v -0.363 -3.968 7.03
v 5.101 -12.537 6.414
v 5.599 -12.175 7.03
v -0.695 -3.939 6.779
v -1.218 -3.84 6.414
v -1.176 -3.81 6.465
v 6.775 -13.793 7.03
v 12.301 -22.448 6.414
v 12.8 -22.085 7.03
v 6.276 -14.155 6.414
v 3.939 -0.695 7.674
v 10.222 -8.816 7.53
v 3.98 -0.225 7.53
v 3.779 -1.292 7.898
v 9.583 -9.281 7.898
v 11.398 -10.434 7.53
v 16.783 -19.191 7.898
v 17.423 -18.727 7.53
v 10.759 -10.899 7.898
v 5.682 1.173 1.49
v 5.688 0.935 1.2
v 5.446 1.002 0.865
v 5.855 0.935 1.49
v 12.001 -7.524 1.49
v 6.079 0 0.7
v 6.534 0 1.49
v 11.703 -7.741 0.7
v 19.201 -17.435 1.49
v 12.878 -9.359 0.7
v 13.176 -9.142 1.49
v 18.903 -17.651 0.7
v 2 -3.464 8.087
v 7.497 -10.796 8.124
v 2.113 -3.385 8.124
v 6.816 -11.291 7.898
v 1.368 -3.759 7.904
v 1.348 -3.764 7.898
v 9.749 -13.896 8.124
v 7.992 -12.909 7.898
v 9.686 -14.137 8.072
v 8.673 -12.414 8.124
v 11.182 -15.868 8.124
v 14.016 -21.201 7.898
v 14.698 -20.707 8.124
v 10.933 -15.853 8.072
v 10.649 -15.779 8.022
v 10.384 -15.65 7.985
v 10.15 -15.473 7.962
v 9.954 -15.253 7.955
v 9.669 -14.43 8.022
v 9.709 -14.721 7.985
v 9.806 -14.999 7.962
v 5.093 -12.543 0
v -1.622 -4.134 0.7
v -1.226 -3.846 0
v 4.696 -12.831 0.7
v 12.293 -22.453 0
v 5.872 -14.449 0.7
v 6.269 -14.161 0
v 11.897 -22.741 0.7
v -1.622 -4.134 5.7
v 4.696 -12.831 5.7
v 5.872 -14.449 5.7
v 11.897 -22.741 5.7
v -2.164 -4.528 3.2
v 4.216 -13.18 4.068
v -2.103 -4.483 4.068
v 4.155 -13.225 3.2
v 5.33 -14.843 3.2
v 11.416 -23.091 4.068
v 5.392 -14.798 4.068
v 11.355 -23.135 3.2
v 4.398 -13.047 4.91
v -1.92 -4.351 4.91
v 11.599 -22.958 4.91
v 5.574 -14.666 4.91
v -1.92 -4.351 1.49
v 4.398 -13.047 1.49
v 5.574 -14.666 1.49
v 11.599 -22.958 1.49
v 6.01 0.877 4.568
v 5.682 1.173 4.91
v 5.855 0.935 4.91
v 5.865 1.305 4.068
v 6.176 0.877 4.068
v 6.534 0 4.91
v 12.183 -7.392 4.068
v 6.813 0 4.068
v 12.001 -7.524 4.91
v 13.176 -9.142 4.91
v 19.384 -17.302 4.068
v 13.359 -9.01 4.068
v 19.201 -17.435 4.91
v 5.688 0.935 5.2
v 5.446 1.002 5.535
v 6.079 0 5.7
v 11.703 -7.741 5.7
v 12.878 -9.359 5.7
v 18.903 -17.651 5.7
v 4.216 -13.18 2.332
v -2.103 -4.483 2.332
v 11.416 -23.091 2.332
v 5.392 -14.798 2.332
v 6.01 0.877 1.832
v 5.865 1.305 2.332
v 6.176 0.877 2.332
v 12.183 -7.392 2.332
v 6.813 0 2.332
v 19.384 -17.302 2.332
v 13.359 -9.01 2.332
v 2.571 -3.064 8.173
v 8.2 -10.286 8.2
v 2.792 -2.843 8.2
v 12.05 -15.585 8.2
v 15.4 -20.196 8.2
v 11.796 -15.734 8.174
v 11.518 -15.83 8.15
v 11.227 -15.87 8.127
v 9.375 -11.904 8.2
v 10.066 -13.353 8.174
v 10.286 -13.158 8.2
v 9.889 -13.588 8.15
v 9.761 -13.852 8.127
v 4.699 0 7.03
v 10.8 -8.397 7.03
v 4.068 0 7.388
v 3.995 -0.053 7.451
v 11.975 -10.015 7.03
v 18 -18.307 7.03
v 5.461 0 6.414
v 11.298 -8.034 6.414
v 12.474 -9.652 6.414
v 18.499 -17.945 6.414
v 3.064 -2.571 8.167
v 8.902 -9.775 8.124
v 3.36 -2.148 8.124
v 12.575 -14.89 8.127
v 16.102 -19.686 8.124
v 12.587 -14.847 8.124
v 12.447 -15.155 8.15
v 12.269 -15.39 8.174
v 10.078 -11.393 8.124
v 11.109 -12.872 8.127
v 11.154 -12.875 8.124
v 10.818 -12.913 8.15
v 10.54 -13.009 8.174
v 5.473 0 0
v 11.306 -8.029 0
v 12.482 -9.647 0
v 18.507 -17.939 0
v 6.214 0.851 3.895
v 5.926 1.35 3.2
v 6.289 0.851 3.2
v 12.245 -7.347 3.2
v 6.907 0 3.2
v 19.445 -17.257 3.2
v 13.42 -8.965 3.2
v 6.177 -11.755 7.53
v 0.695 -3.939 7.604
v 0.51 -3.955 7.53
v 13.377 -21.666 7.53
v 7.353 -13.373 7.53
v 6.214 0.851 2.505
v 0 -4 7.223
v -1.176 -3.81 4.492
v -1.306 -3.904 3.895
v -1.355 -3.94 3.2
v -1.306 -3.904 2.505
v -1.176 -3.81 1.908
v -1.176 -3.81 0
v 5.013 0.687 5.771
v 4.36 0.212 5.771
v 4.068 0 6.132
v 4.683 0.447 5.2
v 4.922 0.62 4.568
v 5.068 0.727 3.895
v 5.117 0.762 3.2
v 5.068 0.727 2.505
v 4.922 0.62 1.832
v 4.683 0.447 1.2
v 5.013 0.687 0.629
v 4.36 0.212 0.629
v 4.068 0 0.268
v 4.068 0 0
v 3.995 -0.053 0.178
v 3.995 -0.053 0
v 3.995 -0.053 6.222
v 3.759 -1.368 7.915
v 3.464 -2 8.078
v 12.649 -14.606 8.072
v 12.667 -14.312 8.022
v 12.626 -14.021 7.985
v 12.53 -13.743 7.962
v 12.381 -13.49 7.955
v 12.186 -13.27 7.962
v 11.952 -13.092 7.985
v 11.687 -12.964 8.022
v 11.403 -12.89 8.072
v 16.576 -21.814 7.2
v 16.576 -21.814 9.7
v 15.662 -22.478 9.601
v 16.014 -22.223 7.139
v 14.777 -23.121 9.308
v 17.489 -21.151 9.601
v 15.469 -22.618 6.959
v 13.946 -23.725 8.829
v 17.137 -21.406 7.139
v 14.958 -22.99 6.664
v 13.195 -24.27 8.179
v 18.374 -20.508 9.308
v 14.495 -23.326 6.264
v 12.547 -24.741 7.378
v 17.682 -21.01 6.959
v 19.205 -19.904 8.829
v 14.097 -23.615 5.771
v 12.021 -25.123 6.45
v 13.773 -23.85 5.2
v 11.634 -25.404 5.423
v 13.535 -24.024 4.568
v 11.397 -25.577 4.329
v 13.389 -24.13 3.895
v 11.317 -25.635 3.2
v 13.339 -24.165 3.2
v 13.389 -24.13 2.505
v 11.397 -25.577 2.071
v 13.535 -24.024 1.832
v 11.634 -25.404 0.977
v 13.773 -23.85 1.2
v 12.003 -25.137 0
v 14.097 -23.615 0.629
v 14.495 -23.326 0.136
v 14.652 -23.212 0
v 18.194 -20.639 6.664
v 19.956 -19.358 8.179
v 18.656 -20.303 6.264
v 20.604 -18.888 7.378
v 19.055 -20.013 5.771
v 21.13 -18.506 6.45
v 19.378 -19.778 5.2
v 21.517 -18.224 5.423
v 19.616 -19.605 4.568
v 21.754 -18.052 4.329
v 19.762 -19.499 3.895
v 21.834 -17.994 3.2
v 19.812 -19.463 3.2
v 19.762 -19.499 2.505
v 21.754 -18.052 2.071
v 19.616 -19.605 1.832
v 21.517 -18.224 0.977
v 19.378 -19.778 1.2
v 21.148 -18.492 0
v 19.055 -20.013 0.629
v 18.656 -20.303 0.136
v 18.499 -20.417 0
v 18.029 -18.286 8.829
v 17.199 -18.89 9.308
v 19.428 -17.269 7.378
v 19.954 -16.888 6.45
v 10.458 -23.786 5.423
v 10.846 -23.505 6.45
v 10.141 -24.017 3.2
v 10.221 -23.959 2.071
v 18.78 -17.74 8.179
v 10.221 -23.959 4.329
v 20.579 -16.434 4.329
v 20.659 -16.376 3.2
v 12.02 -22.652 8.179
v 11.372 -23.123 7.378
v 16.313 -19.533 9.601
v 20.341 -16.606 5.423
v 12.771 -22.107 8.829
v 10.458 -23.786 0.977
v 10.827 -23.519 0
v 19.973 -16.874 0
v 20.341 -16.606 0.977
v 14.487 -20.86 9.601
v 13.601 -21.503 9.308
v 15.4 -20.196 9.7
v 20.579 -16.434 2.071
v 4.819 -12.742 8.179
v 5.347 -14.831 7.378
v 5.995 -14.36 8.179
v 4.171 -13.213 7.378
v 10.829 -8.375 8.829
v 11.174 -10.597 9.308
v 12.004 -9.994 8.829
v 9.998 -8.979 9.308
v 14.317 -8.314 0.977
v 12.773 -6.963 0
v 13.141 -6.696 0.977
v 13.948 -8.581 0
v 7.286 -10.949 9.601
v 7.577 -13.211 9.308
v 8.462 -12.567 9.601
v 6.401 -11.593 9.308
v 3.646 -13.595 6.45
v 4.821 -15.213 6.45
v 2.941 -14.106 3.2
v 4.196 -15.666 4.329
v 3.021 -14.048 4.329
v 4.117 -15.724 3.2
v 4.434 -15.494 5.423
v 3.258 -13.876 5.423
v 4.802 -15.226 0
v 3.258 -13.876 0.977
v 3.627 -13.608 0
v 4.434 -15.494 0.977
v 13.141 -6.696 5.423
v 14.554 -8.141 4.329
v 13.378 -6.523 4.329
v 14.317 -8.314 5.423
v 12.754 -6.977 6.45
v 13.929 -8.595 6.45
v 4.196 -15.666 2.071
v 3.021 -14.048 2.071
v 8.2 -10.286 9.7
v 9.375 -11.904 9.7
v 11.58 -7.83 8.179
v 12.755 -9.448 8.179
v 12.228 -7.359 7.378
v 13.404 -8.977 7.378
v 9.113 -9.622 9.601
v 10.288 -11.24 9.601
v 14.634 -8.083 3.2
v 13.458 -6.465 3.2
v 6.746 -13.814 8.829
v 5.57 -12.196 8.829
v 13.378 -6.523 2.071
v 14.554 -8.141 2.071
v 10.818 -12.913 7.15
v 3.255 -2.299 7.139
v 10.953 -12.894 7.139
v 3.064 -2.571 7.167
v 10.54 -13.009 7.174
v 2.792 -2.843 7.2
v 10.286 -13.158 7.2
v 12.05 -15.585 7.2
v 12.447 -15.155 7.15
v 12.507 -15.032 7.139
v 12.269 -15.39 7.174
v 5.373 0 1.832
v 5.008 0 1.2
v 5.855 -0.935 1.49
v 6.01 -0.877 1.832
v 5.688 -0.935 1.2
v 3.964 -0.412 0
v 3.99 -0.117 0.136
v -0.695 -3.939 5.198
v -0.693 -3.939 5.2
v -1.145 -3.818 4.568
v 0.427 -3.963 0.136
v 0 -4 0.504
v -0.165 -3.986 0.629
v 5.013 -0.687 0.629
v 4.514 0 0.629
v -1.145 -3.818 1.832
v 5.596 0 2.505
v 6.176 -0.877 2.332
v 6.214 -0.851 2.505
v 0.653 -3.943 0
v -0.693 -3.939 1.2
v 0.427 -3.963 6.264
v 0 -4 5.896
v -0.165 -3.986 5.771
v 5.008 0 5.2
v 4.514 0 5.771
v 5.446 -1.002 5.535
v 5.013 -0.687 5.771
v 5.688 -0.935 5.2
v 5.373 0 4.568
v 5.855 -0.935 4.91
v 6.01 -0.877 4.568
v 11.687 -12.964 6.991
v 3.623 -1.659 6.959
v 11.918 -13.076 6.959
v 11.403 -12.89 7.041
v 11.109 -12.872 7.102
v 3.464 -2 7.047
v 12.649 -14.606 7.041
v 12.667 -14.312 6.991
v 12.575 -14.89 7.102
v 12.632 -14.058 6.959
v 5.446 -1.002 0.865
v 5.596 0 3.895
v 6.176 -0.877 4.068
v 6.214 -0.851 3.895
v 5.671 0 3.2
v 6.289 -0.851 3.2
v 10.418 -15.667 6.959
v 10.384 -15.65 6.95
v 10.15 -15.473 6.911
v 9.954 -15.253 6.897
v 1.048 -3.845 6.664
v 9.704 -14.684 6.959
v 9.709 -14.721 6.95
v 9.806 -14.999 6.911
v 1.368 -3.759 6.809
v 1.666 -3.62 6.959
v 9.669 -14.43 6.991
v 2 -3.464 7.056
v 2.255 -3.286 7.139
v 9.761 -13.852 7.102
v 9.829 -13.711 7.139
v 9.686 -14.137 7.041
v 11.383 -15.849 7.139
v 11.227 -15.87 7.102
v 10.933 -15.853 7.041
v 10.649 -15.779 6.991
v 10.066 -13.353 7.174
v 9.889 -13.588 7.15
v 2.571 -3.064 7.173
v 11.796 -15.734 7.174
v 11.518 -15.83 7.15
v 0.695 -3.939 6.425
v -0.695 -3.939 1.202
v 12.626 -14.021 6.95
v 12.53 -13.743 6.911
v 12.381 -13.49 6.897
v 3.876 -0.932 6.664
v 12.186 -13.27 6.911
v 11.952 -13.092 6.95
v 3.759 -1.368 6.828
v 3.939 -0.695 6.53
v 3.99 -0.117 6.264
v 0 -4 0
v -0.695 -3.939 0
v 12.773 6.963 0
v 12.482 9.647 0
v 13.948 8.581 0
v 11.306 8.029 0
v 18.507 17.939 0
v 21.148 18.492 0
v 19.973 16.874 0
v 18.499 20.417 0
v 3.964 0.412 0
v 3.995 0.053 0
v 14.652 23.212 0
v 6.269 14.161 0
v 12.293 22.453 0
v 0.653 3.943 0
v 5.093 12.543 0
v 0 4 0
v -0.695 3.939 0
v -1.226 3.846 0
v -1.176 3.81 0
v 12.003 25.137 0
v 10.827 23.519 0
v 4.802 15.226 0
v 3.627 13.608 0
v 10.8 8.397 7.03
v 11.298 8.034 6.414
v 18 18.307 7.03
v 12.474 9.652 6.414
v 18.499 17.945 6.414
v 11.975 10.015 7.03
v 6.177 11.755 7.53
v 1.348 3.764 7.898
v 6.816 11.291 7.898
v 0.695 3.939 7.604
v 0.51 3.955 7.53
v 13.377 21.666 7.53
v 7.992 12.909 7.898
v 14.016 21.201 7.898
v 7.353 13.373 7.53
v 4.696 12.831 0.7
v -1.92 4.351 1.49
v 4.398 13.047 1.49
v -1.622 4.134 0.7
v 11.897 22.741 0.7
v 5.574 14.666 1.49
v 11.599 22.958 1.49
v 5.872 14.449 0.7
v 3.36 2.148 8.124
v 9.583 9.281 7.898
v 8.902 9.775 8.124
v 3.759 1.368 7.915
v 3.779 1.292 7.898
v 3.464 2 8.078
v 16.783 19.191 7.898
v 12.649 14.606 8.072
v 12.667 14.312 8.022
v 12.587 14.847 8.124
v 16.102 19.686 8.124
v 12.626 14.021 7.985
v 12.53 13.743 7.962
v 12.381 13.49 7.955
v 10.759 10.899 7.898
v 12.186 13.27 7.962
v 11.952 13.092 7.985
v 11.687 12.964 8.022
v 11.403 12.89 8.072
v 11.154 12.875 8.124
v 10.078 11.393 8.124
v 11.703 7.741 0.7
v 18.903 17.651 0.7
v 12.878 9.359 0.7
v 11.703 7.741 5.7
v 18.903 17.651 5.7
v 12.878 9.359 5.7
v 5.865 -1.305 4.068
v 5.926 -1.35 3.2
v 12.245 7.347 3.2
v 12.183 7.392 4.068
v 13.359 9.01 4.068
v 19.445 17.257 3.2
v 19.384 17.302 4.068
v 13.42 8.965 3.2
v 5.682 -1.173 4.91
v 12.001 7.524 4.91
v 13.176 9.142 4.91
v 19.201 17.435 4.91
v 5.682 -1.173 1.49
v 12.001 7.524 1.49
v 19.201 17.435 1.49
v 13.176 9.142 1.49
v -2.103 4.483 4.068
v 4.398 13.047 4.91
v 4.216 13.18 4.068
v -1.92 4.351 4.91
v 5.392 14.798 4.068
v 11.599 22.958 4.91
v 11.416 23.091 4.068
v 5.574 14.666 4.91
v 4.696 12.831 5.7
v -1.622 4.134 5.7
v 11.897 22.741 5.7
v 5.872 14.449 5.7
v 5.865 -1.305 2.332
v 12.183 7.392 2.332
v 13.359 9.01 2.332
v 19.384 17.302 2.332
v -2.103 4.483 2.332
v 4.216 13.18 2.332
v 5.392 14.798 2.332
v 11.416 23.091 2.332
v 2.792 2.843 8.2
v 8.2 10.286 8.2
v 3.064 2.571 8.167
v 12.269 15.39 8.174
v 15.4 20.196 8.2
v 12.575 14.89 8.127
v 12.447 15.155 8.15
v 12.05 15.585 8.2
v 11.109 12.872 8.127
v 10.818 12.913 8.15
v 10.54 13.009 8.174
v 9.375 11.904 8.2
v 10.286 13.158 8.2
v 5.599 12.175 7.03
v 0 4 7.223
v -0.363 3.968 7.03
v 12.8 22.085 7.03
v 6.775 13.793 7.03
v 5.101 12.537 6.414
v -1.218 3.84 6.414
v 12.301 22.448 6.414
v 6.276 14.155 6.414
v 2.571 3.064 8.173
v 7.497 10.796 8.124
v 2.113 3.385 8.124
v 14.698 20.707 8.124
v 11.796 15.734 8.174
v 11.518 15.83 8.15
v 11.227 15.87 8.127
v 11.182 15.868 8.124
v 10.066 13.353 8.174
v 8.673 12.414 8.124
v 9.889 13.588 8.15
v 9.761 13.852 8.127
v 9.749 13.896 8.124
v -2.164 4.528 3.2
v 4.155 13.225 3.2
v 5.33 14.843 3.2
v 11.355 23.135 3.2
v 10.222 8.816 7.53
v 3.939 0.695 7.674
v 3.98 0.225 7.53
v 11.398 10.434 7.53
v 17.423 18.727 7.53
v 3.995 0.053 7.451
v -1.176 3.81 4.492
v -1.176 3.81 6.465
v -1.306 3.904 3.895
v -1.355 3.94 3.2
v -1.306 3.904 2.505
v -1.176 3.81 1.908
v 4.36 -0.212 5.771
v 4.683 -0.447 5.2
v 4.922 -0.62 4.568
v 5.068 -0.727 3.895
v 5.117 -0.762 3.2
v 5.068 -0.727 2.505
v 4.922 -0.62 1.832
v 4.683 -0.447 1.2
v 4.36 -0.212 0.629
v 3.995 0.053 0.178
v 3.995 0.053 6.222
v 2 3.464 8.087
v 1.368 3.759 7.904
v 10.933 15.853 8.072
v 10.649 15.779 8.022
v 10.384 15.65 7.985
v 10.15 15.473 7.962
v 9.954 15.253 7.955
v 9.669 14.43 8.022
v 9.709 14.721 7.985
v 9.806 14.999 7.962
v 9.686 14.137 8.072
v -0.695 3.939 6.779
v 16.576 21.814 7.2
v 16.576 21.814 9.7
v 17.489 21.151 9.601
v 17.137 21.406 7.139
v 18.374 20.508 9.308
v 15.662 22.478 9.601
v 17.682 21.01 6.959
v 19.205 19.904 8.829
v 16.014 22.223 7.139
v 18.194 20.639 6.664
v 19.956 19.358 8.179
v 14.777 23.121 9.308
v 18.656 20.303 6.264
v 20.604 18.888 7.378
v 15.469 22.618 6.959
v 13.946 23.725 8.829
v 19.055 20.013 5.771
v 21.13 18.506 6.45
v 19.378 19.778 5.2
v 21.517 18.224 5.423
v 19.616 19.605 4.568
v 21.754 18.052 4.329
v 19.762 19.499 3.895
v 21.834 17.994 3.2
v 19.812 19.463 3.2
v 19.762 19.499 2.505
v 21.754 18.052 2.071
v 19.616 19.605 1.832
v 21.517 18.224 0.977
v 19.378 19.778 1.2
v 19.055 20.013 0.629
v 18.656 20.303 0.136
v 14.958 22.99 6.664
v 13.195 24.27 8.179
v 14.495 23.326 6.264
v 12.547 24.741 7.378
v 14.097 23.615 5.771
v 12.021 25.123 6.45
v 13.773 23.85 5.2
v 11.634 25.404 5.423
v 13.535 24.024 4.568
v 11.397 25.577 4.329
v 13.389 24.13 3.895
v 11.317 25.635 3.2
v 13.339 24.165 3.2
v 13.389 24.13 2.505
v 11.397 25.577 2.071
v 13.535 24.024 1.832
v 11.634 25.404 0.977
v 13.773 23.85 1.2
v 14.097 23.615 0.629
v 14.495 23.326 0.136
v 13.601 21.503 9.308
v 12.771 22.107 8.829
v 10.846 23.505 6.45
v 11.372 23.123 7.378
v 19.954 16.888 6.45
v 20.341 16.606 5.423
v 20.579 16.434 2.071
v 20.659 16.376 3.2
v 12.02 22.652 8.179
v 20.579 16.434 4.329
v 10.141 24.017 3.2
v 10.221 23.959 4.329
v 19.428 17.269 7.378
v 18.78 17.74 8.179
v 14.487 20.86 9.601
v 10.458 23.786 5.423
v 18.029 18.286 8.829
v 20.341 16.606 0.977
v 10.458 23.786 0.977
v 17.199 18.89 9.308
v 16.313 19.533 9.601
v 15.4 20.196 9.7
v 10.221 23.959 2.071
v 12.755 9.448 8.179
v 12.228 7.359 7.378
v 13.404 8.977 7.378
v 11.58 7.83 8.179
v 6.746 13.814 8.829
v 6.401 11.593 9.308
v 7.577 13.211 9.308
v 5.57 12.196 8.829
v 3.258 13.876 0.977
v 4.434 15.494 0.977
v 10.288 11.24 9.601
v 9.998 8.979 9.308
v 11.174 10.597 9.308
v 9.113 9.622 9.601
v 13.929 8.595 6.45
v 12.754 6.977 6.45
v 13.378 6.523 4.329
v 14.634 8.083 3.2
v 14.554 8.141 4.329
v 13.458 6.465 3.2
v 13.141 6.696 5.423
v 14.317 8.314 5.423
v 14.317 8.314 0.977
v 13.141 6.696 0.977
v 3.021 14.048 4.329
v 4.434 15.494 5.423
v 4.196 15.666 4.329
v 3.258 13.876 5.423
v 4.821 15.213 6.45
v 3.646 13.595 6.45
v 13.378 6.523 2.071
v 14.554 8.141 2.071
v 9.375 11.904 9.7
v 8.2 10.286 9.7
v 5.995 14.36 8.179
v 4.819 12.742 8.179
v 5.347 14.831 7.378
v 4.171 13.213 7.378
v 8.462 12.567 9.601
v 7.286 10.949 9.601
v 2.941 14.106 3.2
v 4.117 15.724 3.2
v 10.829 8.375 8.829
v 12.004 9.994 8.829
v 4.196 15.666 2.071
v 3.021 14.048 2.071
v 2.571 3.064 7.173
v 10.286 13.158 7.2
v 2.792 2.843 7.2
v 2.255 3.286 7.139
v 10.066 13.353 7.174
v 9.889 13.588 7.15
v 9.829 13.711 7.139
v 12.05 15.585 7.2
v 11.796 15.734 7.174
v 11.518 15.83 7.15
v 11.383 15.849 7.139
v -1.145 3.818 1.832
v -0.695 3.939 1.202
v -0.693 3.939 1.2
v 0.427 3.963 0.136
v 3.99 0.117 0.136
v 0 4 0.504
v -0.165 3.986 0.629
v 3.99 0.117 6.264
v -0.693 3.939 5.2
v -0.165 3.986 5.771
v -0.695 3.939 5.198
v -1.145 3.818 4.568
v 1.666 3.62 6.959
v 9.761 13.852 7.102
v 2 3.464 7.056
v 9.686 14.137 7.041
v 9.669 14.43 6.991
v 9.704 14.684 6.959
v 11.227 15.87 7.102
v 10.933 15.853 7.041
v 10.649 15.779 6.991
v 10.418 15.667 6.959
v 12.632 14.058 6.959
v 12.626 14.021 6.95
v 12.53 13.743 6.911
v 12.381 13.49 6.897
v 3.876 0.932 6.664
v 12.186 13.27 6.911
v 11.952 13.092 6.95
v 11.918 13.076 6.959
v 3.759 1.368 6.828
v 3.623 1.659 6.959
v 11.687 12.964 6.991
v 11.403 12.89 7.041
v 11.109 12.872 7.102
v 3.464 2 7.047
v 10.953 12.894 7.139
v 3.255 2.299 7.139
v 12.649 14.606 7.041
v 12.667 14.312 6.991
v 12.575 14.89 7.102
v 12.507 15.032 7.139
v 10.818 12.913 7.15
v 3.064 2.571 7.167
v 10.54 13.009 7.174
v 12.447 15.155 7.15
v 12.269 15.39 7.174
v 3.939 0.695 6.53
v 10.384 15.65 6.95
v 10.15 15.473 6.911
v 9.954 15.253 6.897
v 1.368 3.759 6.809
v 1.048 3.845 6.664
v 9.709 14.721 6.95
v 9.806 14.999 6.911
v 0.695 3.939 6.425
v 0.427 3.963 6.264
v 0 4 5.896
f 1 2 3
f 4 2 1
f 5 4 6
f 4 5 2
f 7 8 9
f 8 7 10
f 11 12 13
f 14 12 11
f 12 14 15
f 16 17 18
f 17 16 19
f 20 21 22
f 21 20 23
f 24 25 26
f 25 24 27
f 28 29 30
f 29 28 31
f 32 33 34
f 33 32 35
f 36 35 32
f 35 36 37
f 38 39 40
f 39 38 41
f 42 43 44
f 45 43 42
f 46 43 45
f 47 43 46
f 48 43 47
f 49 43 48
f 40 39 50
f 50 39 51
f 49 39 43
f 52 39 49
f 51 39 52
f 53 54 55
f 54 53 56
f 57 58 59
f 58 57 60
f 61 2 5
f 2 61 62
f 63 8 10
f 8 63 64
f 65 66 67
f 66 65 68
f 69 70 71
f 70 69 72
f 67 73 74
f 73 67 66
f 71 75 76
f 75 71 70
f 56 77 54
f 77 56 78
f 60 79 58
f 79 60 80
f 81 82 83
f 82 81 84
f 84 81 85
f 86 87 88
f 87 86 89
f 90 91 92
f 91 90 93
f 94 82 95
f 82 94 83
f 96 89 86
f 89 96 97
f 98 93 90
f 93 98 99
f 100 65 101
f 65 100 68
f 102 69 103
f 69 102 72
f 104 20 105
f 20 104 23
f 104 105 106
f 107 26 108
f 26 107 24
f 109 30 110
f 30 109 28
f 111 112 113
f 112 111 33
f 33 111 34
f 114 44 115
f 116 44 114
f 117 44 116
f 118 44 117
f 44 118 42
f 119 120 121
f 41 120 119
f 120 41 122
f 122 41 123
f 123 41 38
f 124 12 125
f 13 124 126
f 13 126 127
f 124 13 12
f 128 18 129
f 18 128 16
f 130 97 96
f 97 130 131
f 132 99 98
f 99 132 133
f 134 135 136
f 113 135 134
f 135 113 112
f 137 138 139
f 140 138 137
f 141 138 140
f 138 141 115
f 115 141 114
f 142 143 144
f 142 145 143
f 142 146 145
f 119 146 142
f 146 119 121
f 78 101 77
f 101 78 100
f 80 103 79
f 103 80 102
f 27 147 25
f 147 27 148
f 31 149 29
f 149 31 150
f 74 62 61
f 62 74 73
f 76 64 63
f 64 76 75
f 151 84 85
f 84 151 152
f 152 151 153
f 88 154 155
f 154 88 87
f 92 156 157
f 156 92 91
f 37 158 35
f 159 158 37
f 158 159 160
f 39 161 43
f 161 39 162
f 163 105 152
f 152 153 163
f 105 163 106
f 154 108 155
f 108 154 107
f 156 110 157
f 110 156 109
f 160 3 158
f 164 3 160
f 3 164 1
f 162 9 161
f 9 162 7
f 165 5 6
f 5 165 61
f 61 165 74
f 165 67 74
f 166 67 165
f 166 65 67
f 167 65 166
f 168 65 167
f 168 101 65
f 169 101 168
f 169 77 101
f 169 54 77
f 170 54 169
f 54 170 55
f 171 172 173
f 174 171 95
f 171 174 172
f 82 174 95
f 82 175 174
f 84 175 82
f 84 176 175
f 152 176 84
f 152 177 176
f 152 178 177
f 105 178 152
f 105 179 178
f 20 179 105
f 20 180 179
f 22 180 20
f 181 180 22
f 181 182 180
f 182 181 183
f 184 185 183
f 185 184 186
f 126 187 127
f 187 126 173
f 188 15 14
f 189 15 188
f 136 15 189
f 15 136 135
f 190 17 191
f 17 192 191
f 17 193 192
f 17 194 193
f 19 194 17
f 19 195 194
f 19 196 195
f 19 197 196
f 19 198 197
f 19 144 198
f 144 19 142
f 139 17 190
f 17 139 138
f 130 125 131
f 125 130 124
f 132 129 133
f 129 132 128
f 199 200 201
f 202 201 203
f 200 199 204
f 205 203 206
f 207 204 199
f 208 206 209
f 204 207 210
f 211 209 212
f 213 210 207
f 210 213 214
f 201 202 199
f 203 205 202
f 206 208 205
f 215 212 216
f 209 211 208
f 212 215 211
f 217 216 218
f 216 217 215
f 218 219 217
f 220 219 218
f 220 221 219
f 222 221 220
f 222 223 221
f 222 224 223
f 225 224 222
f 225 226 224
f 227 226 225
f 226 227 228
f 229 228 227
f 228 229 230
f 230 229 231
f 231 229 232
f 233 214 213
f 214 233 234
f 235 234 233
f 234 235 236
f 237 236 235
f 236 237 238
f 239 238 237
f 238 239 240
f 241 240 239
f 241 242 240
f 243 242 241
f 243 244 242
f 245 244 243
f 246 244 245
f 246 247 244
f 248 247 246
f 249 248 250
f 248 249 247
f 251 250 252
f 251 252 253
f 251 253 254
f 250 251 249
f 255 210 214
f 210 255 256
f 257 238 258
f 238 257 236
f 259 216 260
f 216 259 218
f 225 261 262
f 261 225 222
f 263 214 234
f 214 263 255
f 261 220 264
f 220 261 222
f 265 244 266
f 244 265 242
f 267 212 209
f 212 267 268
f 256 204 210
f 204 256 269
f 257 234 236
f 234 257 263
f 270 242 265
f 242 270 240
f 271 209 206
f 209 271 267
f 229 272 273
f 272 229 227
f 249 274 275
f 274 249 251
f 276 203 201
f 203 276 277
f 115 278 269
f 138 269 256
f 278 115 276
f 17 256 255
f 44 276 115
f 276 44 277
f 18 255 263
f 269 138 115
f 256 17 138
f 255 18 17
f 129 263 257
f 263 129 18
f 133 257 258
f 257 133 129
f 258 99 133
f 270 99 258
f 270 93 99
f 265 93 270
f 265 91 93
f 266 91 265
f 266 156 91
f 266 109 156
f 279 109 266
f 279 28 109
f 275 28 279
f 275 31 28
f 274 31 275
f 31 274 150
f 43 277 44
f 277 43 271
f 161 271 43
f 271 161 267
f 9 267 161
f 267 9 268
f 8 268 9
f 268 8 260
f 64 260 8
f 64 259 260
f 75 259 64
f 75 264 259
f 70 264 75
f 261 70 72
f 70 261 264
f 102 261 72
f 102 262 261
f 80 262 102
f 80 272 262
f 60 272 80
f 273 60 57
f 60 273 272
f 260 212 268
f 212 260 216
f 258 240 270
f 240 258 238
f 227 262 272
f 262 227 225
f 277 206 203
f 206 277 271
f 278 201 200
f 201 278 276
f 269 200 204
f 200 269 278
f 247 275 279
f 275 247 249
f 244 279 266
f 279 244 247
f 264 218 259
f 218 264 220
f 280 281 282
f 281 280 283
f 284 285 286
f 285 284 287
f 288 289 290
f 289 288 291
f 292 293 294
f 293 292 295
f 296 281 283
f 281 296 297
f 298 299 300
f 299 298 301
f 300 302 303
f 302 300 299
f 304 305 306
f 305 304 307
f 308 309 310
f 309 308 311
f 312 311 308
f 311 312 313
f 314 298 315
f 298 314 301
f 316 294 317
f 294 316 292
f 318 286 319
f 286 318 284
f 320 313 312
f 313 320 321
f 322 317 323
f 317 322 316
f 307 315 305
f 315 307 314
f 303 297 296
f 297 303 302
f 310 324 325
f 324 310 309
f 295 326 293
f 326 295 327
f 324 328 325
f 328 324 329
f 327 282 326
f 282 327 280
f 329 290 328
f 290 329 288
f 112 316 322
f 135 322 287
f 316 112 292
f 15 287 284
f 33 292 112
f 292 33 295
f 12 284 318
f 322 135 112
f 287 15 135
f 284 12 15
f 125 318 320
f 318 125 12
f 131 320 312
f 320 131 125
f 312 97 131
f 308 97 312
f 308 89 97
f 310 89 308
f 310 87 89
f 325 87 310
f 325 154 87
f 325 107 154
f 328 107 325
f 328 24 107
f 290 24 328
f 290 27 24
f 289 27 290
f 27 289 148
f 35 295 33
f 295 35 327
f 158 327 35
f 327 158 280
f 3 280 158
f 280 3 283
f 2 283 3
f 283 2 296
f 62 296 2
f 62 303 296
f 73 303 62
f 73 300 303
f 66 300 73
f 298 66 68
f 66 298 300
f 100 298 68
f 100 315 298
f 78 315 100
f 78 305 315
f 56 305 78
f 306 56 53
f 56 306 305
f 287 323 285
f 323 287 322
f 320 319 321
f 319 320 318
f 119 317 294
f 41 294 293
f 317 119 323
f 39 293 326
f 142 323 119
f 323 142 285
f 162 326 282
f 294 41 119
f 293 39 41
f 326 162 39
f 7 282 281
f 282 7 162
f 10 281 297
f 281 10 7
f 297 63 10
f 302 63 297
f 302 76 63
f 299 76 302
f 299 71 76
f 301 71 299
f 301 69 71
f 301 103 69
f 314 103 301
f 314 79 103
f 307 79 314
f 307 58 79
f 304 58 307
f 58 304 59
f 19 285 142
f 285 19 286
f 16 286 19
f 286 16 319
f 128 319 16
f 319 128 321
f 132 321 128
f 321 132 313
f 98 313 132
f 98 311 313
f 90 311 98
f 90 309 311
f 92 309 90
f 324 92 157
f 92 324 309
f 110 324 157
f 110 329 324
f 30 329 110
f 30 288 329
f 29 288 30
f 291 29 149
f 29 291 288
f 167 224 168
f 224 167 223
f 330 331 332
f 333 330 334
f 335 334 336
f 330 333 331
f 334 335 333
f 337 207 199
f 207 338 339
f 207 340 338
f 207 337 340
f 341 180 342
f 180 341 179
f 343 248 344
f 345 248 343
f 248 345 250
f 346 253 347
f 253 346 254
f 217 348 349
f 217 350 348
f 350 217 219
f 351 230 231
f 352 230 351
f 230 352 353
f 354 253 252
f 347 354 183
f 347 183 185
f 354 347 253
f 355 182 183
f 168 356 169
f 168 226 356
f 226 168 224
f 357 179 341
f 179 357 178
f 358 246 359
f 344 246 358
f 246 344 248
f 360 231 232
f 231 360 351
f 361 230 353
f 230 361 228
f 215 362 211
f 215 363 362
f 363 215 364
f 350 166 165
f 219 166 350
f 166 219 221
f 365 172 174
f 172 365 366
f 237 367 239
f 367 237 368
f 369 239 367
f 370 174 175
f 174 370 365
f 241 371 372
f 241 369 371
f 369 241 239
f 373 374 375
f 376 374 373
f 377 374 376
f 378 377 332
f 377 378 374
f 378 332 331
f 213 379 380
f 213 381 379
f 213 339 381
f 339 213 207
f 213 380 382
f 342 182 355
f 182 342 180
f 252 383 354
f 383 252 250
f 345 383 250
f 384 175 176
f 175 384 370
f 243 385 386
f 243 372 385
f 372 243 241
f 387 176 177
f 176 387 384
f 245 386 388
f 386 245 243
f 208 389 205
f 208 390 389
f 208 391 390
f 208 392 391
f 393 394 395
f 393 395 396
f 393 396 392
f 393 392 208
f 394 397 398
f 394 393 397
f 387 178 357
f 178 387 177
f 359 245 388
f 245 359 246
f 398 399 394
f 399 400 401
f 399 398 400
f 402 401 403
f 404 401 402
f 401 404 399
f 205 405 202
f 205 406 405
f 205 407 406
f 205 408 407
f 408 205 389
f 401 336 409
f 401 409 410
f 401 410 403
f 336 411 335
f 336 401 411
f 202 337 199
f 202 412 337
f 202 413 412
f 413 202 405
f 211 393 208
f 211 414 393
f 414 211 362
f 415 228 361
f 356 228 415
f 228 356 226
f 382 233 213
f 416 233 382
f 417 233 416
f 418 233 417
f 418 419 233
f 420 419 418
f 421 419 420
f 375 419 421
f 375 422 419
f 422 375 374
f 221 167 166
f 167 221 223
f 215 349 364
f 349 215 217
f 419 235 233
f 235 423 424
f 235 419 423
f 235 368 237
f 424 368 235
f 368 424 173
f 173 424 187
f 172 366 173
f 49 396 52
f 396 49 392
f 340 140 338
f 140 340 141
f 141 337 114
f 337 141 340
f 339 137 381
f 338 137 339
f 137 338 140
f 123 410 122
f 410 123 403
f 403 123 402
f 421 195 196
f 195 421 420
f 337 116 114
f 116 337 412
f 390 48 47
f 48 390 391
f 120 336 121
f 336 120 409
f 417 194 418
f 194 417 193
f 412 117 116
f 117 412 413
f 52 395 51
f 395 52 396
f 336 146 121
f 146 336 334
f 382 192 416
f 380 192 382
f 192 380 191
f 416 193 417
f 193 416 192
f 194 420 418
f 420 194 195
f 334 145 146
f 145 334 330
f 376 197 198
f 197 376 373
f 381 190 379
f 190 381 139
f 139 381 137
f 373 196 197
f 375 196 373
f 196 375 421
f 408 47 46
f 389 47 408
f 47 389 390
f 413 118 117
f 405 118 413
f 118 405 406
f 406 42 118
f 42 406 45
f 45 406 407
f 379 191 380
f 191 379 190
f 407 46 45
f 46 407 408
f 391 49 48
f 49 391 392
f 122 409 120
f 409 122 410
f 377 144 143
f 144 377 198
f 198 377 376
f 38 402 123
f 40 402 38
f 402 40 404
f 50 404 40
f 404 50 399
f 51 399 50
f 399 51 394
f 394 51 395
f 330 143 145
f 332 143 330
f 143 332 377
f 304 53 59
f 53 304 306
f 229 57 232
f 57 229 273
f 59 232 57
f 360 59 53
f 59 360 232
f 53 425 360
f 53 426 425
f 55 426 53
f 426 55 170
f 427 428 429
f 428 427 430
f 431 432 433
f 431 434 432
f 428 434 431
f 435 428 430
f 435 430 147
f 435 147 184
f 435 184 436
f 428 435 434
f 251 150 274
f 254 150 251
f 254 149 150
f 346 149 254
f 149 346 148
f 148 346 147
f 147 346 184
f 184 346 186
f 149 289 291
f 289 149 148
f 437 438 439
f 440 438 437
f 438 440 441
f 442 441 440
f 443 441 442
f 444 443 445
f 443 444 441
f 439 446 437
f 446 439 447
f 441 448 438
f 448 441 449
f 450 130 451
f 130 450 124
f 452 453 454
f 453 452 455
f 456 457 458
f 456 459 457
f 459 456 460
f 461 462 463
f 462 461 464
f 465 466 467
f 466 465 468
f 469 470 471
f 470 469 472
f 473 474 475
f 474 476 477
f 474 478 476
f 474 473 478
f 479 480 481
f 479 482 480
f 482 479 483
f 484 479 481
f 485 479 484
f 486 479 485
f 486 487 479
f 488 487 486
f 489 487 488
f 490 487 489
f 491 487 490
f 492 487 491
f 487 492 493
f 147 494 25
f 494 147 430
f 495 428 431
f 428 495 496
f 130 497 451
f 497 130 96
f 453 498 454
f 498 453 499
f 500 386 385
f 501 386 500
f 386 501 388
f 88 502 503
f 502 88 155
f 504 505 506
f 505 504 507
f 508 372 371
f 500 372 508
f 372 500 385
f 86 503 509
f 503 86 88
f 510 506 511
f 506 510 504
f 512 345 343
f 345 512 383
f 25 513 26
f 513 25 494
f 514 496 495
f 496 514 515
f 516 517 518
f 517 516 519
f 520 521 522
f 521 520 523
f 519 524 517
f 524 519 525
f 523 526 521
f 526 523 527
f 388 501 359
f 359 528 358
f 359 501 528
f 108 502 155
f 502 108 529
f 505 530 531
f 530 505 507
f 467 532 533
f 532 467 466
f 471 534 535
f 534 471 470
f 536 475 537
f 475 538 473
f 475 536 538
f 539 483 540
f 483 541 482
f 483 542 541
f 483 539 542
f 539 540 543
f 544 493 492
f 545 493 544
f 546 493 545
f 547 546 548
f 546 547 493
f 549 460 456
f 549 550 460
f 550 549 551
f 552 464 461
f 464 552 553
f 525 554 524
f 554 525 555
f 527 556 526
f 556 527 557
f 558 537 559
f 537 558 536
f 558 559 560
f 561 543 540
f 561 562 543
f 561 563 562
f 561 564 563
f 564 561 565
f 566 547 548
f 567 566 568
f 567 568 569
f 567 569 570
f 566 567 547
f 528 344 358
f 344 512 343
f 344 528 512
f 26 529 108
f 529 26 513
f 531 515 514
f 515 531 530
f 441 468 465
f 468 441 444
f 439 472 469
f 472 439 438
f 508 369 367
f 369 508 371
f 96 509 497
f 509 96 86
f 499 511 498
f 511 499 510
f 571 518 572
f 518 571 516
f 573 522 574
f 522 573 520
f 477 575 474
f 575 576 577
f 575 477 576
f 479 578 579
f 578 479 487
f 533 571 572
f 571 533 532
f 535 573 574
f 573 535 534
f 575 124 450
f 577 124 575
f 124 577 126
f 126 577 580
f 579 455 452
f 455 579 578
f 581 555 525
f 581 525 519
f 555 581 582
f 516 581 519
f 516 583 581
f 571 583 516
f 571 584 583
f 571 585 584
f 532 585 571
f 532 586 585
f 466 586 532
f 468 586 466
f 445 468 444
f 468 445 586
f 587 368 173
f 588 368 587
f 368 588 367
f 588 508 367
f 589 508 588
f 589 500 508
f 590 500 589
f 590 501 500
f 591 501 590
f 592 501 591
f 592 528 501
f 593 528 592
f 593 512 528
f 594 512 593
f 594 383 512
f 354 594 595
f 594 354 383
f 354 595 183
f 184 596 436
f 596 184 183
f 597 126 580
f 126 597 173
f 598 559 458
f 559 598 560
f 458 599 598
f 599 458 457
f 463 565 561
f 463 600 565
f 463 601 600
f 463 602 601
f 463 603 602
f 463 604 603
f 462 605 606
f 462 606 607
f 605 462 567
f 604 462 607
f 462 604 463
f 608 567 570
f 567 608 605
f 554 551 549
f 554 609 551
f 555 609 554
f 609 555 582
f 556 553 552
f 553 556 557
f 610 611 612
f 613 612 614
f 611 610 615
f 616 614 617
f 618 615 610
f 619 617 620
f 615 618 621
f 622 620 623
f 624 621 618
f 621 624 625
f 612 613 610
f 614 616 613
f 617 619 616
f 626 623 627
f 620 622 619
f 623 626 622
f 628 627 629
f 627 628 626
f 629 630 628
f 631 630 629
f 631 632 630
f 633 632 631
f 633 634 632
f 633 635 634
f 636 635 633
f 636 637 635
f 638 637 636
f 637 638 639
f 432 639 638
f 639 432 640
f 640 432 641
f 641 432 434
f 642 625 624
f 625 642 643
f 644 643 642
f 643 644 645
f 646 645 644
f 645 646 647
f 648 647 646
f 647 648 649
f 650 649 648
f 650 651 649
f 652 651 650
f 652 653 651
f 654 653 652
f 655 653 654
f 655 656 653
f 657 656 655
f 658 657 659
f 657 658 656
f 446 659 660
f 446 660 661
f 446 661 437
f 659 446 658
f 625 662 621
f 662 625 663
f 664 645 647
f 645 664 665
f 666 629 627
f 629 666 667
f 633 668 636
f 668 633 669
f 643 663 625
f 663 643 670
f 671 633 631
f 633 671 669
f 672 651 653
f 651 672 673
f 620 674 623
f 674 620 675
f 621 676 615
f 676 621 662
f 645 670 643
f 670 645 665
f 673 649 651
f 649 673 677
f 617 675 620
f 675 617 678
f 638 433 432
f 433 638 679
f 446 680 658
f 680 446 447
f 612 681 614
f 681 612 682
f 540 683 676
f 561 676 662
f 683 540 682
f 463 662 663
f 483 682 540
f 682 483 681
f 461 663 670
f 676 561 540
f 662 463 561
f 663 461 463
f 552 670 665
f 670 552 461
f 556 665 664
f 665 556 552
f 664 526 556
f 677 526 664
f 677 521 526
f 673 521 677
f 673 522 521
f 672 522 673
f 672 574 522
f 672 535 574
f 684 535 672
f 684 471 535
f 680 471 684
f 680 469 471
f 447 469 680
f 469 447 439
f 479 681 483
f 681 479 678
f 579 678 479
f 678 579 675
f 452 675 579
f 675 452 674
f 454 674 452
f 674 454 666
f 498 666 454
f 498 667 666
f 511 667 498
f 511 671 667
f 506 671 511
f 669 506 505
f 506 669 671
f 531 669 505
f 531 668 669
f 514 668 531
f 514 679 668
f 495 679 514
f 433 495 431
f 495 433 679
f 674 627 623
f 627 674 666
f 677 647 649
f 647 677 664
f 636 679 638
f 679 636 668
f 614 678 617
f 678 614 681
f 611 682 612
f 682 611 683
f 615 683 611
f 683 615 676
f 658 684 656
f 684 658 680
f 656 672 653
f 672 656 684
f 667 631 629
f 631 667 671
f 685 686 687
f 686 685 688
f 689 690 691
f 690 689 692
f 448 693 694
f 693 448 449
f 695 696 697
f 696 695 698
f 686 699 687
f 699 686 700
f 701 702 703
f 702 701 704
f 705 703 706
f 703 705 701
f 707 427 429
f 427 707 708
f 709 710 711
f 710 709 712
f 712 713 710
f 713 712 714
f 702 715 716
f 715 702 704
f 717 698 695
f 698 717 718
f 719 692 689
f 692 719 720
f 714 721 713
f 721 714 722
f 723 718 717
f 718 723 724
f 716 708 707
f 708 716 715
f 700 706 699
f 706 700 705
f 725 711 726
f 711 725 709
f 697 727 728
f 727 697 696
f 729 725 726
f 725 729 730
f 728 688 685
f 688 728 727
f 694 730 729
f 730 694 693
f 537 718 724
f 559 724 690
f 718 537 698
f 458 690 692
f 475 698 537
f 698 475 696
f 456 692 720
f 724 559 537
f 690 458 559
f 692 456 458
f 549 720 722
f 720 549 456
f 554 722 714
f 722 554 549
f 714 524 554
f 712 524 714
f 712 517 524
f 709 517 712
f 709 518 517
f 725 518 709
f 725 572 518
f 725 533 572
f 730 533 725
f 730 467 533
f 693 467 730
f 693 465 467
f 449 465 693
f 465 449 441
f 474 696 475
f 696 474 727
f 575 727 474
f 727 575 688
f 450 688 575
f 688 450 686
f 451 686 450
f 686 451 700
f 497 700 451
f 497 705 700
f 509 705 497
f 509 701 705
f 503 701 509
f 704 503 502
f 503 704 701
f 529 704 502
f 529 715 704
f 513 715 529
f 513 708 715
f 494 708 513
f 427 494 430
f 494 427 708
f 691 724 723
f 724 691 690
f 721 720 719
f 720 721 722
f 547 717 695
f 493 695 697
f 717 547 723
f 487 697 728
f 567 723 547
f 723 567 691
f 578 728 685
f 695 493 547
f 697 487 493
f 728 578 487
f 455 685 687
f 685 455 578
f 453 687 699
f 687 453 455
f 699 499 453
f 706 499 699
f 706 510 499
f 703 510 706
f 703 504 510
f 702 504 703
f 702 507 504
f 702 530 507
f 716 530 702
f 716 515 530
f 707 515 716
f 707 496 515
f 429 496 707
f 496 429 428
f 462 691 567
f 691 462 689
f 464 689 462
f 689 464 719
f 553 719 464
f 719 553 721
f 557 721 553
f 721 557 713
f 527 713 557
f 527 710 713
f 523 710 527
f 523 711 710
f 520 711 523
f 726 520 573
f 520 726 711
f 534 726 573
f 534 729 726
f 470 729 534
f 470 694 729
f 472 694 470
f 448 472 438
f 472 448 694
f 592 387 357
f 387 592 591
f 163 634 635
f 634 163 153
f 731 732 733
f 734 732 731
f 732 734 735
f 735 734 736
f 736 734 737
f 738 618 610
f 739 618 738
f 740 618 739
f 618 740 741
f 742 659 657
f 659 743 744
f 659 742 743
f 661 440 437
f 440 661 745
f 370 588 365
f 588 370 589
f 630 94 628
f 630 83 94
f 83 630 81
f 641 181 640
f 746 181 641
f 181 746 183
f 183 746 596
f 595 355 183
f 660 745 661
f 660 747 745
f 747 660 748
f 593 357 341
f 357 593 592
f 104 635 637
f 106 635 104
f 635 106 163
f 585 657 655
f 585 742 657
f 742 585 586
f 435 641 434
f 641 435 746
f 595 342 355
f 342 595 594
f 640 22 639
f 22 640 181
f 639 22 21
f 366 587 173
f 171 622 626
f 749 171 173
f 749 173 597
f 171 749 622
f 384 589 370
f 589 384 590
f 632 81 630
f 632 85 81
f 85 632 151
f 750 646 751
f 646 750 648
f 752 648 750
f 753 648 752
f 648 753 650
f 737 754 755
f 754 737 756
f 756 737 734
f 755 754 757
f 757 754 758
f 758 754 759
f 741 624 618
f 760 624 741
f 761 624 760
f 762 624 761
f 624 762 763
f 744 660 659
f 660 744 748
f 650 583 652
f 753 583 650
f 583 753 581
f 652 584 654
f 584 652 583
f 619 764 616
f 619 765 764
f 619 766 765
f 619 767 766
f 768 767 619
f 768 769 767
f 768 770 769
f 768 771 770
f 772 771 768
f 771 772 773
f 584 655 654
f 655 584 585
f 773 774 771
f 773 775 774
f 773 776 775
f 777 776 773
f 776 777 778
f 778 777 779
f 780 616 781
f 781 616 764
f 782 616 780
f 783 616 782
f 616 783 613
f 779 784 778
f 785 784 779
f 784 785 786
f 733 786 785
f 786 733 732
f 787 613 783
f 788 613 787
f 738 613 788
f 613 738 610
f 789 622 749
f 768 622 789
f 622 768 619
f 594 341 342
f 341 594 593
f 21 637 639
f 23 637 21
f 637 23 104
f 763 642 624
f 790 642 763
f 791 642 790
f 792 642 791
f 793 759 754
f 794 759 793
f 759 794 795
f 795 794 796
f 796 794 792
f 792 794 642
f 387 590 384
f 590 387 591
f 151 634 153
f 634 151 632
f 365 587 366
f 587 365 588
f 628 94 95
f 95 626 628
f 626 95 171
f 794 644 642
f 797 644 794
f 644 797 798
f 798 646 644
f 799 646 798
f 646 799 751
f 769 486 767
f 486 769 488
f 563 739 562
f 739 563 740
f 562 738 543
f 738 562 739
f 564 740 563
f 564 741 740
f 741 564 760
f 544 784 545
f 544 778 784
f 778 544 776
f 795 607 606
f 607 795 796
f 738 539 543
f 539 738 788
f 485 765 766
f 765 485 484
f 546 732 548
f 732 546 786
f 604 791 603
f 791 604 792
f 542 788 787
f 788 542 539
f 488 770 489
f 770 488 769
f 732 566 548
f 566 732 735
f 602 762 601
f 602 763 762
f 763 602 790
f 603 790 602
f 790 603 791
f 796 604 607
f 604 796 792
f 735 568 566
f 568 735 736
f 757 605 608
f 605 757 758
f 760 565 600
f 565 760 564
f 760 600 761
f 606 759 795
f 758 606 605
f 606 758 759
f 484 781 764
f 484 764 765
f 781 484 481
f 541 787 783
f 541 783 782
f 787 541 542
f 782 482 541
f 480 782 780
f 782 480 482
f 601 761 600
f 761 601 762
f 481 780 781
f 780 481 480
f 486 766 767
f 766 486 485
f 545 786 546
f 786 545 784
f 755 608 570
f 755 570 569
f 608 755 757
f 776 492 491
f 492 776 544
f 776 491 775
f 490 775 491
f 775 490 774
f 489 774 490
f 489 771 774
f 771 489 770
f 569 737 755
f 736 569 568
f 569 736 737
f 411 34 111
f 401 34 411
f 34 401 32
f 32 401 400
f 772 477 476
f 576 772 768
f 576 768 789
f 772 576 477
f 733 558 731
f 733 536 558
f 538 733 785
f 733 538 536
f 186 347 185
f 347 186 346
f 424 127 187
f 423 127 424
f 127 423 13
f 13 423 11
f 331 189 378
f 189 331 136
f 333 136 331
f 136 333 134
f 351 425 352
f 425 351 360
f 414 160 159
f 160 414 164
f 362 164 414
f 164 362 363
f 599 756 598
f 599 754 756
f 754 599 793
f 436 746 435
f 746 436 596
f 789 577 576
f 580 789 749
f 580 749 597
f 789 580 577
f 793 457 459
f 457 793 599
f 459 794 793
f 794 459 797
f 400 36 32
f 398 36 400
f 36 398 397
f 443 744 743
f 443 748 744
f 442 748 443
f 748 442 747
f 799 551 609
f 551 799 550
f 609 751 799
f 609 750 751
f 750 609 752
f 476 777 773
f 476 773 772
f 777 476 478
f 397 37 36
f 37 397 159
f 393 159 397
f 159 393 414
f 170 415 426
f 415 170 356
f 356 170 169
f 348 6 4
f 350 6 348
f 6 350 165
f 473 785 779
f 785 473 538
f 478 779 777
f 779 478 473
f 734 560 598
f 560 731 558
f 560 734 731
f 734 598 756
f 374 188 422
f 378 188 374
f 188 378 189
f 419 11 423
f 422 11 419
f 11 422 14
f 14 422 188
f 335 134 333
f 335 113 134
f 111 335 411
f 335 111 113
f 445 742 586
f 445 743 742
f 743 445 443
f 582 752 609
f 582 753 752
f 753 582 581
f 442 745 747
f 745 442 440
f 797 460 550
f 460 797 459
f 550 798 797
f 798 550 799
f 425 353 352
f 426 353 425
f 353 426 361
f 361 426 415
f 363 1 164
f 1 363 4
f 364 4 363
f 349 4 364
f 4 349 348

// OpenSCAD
/*#################################################################################*\
    Flat_Joint_1.0.scad
	-----------------------------------------------------------------------------

	Developed by:			Richard A. Milewski
	Description:            Parametric Flat Joint for Bamboo 

	Version:                2.5
	Creation Date:          21 Apr 2021
	Modification Dates:     25 May 2022 - Added Optional Top Plate
                            26 May 2022 - Changed calculation of lenV
                            30 MAY 2022 - Added inner zip tie collar
	                        02 Jun 2022 - Adjusted Secondary Parameters	
                            13 Jun 2022 - Revised lenH & lenV calculations
   
    Copyright ©2021-2022 by Richard A. Milewski
    License - CC-BY-NC      https://creativecommons.org/licenses/by-nc/3.0/ 

\*#################################################################################*/

/*#################################################################################*|

    NOTES
        If your printer supports it, I highly recommend printing these parts 
        with TPU filament.  If not, PETG appears to weather better than PLA.

        ABS and ASA are not recommended.  They are more UV resistant, but quite 
        hazerdous to print without proper ventilation.  Use at your own risk.

        IMPORTANT: If you fasten with zip ties use those labeled "UV resistant" and
        with a minimum of 40lbs of tensile strength.  Use a zip tie gun!

        If you print with the optional top cap, closely matching diaV to the diameter
        of the bamboo is more important, particularly if you print with rigid filament.

\*#################################################################################*/

/*#################################################################################*\

    CONFIGURATION

\*#################################################################################*/

/* [Primary Parameters] */

// This part is for the topmost ring and has a top cap
top = false; // [true,false]
// Number of sides
sides = 5;   // [1,2,3,4,5,6,7,8,9,10]   

/*  ABOUT BAMBOO DIAMETERS
    Bamboo horizontals should be cut and then sorted so that the end diamters of each
    ring are within 2mm of each other then set diaH to the mean value of the diameters.
    Bamboo verticals should be measured at the mount point for each horizontal ring
    and diaV set to the mean value of diameters at that mount point.
    Obviously, joints printed with flex filament are more forgiving of diameter
    mis-matches than those printed from rigid filament. 
*/

// Diameter of horizontal bamboo in mm
diaH  = 8;  // [5:0.25:25]  
// Diameter of vertical bamboo in mm
diaV  = 8 ;  // [5:0.25:25]  


/* [Secondary Parameters - CHANGE WITH CAUTION!] */ 

// Keep everything round | higher numbers increase rendering time.
$fn = 36;
// Tube shell thickness in mm  | 1 for flex, >=1.5 for rigid filament.
shell = 1;    
// Height in mm of zip tie collars above shell
collarH = 1.5;  
// Width in mm of zip tie collars
collarW = 2;
// Length of vertical above the horizontals in vertical diameters 
lengthV = 2;    
// Length of horizontals in diameters
lengthH = 2;    
// Hole position on horizontals (% of LengthH) 
screwH = 60;
// Hole positon on vertical (% of LengthV)
screwV = 70;  
// Diameter of screw hole in mm
diaScr = 3;   
// Fudge factor to adjust horizontal part separation
fudge  = -0.25; 
// Fudge factor to keep holes visible in preview  
fudgeP = 0.5;
// Thickness of top plate
topZ  = 1.5;

/*  
Tube Wrap parameters
Higher numbers provide a more secure joint, lower reduce print time.
40 is a recommended starting point for flex filament, 25 for rigid filament.
Low values, with shell values >= 2 may work if you use the wire-wrap method 
to secure the bamboo to the joint.
*/

// Adjust the vertical tube wrap
wrapV = 45;  // [15:48]
// Adjust the horizontal tube wrap
wrapH = 40;  // [15:48]


// Derived values
liftH = diaH * (wrapH/100);              // Vertical shift of horizontal tubes to adjust wrap
shiftV = diaV * (wrapV/100);             // Horizontal shift of the clearing block to adjust vertical wrap
lenH = diaH * lengthH + diaV + shell;    // Length of horizontal fittings
collarDiaH  = diaH+shell*2+collarH*2;    // Diameter of collar on horizontal fittings
heightH = diaH-liftH+shell;              // Height of horizontals (minus tire-wrap collars).        
lenV = diaV * lengthV + diaH + shell; // Length of vertical fittings
collarDiaV  = diaV+shell*2+collarH*2;    // Diameter of collar on vertical fitting
fudge2  = (fudge) * (diaV/2);            // Fudge factor for Hpart spacing. (pulled out of thin air)
posScrH = screwH/100;                    // Position of screw on horizontals
PosCol2H = lenH*posScrH-diaScr*0.75;     // Position of inner collar on horizontals 
posScrV = screwV/100;                    // Position of screw on vertical
PosCol2V = lenV*posScrV-diaScr*0.75;     // Position of inner collar on horizontals 
angles  = (sides - 2) * 180;             // Sum of interior angles of the polygon
angle = angles / sides;                  // Interior angle of a corner   

/*#################################################################################*|

    MAIN

\*#################################################################################*/


difference() {
    color("DeepSkyBlue",1 ) {
        union() {  // Combine the horizontals and the verticals
                Hparts();
        }}
    // Clear the core of the vertical tube
    translate ([0, 0, -1])
        cylinder (d = diaV, h = lenV + 2);
    // ...and the space below the plane
    translate ([-50,-50,-50])
        cube ([100,100,50]);
}
color("DeepSkyBlue",1 ) {
    // Add top plate (or not)
    if (top == true) {
        difference() {
            cylinder(h=topZ, d=diaV+shell*2);
            cylinder(h=topZ+fudgeP, d=diaScr);
        }
    }
}





/*#################################################################################*|

    MODULES

\*#################################################################################*/

// "We control the horizontal..."

module Hparts() {
    if (sides > 2) {  // Polygonal or Zig-zag Trellis
        translate ([0, -fudge2, 0])
            rotate(-angle/2,[0,0,1])
                Hpart();

        translate ([0, fudge2, 0])
            rotate(angle/2,[0,0,1])
                Hpart();
    }     
    if (sides == 1) {Hpart();}  // Special case for L bracket
    if (sides == 2) {           // Special case for T bracket
        translate ([shiftV, -fudge2, 0])
        rotate(-90,[0,0,1])
            Hpart();

        translate ([shiftV, fudge2, 0])
        rotate(90,[0,0,1])
            Hpart();

        // Fill the gap across the vertical
        difference() {
            translate ([shiftV, -diaV/2-shell, liftH])
            rotate([0,90,90])
                cylinder (d = (diaH + 2*shell), h = diaV + 2*shell);

            translate ([shiftV, -diaV/2-shell-1, liftH])
                rotate([0,90,90])
                    cylinder (d = diaH, h = diaV + 2*shell+2);
        }
    }
}

module Hpart () {
    
    difference() { // Slice off part of the tube

        Htube ();
            
          translate([diaV/2-1, collarDiaH/-2, -collarDiaH])
                cube ([lenH+2, collarDiaH, collarDiaH]);
    }
}

module Htube() {
    difference() {
 
        difference() {
            translate([diaV/2.5,0,liftH])
           
               union() {
                 // The tube
                 rotate([0,90,0])
                    cylinder (d = (diaH + 2*shell), h = lenH );
                
                 // The zip tie collar  
                 translate ([lenH - collarW, 0, 0])
                    rotate([0,90,0])
                        cylinder (d = collarDiaH, h = collarW );

                 // The inner zip tie collar  
                 translate ([PosCol2H - collarW, 0, 0])
                    rotate([0,90,0])
                        cylinder (d = collarDiaH, h = collarW );
               }
                union() {
                    // Clear he central core of the tube
                    translate([diaV/2-1,0,liftH])
                    rotate([0,90,0])
                        cylinder (d = diaH, h = lenH + 2);
                    
                    //The screw hole
                    translate([diaV/2 + ( lenH*posScrH ),0,0])
                        cylinder ($fn = 32, d = diaScr, h = diaH + shell);    
            }   
        }
    }
}


// "...and we control the vertical." 

module Vpart() {
    
    difference() { // Slice off part of the tube      
        Vtube(); 
        translate([(-collarDiaV/2)-shiftV, -collarDiaV/2, -0.5])
            cube ([collarDiaV/2, collarDiaV, lenV+1]);   
    }
}


module Vtube () {
    difference() {
        union() {
            // The tube
            translate ([0, 0, 0])
                cylinder (d = (diaV + 2*shell), h = lenV);
        
            // The zip tie collar
            translate ([0, 0, lenV-collarW])
                cylinder (d = collarDiaV, h = collarW );

            // The inner zip tie collar  
            translate ([0,0,PosCol2V - collarW])
                rotate([0,0,0])
                cylinder (d = collarDiaV, h = collarW );

        }              
            // The Screw Hole
            translate([0,0,lenV * posScrV])
            rotate([0,90,0])
                cylinder ($fn = 32, d = diaScr, h = diaV + shell);    
    }
}

echo("*****");
echo();
label = str("-",sides,"-",diaH,"-",diaV);
echo(label);

// "We now return control of your system to you."
//      ...with apologies to the old Outer Limits TV show writers.
